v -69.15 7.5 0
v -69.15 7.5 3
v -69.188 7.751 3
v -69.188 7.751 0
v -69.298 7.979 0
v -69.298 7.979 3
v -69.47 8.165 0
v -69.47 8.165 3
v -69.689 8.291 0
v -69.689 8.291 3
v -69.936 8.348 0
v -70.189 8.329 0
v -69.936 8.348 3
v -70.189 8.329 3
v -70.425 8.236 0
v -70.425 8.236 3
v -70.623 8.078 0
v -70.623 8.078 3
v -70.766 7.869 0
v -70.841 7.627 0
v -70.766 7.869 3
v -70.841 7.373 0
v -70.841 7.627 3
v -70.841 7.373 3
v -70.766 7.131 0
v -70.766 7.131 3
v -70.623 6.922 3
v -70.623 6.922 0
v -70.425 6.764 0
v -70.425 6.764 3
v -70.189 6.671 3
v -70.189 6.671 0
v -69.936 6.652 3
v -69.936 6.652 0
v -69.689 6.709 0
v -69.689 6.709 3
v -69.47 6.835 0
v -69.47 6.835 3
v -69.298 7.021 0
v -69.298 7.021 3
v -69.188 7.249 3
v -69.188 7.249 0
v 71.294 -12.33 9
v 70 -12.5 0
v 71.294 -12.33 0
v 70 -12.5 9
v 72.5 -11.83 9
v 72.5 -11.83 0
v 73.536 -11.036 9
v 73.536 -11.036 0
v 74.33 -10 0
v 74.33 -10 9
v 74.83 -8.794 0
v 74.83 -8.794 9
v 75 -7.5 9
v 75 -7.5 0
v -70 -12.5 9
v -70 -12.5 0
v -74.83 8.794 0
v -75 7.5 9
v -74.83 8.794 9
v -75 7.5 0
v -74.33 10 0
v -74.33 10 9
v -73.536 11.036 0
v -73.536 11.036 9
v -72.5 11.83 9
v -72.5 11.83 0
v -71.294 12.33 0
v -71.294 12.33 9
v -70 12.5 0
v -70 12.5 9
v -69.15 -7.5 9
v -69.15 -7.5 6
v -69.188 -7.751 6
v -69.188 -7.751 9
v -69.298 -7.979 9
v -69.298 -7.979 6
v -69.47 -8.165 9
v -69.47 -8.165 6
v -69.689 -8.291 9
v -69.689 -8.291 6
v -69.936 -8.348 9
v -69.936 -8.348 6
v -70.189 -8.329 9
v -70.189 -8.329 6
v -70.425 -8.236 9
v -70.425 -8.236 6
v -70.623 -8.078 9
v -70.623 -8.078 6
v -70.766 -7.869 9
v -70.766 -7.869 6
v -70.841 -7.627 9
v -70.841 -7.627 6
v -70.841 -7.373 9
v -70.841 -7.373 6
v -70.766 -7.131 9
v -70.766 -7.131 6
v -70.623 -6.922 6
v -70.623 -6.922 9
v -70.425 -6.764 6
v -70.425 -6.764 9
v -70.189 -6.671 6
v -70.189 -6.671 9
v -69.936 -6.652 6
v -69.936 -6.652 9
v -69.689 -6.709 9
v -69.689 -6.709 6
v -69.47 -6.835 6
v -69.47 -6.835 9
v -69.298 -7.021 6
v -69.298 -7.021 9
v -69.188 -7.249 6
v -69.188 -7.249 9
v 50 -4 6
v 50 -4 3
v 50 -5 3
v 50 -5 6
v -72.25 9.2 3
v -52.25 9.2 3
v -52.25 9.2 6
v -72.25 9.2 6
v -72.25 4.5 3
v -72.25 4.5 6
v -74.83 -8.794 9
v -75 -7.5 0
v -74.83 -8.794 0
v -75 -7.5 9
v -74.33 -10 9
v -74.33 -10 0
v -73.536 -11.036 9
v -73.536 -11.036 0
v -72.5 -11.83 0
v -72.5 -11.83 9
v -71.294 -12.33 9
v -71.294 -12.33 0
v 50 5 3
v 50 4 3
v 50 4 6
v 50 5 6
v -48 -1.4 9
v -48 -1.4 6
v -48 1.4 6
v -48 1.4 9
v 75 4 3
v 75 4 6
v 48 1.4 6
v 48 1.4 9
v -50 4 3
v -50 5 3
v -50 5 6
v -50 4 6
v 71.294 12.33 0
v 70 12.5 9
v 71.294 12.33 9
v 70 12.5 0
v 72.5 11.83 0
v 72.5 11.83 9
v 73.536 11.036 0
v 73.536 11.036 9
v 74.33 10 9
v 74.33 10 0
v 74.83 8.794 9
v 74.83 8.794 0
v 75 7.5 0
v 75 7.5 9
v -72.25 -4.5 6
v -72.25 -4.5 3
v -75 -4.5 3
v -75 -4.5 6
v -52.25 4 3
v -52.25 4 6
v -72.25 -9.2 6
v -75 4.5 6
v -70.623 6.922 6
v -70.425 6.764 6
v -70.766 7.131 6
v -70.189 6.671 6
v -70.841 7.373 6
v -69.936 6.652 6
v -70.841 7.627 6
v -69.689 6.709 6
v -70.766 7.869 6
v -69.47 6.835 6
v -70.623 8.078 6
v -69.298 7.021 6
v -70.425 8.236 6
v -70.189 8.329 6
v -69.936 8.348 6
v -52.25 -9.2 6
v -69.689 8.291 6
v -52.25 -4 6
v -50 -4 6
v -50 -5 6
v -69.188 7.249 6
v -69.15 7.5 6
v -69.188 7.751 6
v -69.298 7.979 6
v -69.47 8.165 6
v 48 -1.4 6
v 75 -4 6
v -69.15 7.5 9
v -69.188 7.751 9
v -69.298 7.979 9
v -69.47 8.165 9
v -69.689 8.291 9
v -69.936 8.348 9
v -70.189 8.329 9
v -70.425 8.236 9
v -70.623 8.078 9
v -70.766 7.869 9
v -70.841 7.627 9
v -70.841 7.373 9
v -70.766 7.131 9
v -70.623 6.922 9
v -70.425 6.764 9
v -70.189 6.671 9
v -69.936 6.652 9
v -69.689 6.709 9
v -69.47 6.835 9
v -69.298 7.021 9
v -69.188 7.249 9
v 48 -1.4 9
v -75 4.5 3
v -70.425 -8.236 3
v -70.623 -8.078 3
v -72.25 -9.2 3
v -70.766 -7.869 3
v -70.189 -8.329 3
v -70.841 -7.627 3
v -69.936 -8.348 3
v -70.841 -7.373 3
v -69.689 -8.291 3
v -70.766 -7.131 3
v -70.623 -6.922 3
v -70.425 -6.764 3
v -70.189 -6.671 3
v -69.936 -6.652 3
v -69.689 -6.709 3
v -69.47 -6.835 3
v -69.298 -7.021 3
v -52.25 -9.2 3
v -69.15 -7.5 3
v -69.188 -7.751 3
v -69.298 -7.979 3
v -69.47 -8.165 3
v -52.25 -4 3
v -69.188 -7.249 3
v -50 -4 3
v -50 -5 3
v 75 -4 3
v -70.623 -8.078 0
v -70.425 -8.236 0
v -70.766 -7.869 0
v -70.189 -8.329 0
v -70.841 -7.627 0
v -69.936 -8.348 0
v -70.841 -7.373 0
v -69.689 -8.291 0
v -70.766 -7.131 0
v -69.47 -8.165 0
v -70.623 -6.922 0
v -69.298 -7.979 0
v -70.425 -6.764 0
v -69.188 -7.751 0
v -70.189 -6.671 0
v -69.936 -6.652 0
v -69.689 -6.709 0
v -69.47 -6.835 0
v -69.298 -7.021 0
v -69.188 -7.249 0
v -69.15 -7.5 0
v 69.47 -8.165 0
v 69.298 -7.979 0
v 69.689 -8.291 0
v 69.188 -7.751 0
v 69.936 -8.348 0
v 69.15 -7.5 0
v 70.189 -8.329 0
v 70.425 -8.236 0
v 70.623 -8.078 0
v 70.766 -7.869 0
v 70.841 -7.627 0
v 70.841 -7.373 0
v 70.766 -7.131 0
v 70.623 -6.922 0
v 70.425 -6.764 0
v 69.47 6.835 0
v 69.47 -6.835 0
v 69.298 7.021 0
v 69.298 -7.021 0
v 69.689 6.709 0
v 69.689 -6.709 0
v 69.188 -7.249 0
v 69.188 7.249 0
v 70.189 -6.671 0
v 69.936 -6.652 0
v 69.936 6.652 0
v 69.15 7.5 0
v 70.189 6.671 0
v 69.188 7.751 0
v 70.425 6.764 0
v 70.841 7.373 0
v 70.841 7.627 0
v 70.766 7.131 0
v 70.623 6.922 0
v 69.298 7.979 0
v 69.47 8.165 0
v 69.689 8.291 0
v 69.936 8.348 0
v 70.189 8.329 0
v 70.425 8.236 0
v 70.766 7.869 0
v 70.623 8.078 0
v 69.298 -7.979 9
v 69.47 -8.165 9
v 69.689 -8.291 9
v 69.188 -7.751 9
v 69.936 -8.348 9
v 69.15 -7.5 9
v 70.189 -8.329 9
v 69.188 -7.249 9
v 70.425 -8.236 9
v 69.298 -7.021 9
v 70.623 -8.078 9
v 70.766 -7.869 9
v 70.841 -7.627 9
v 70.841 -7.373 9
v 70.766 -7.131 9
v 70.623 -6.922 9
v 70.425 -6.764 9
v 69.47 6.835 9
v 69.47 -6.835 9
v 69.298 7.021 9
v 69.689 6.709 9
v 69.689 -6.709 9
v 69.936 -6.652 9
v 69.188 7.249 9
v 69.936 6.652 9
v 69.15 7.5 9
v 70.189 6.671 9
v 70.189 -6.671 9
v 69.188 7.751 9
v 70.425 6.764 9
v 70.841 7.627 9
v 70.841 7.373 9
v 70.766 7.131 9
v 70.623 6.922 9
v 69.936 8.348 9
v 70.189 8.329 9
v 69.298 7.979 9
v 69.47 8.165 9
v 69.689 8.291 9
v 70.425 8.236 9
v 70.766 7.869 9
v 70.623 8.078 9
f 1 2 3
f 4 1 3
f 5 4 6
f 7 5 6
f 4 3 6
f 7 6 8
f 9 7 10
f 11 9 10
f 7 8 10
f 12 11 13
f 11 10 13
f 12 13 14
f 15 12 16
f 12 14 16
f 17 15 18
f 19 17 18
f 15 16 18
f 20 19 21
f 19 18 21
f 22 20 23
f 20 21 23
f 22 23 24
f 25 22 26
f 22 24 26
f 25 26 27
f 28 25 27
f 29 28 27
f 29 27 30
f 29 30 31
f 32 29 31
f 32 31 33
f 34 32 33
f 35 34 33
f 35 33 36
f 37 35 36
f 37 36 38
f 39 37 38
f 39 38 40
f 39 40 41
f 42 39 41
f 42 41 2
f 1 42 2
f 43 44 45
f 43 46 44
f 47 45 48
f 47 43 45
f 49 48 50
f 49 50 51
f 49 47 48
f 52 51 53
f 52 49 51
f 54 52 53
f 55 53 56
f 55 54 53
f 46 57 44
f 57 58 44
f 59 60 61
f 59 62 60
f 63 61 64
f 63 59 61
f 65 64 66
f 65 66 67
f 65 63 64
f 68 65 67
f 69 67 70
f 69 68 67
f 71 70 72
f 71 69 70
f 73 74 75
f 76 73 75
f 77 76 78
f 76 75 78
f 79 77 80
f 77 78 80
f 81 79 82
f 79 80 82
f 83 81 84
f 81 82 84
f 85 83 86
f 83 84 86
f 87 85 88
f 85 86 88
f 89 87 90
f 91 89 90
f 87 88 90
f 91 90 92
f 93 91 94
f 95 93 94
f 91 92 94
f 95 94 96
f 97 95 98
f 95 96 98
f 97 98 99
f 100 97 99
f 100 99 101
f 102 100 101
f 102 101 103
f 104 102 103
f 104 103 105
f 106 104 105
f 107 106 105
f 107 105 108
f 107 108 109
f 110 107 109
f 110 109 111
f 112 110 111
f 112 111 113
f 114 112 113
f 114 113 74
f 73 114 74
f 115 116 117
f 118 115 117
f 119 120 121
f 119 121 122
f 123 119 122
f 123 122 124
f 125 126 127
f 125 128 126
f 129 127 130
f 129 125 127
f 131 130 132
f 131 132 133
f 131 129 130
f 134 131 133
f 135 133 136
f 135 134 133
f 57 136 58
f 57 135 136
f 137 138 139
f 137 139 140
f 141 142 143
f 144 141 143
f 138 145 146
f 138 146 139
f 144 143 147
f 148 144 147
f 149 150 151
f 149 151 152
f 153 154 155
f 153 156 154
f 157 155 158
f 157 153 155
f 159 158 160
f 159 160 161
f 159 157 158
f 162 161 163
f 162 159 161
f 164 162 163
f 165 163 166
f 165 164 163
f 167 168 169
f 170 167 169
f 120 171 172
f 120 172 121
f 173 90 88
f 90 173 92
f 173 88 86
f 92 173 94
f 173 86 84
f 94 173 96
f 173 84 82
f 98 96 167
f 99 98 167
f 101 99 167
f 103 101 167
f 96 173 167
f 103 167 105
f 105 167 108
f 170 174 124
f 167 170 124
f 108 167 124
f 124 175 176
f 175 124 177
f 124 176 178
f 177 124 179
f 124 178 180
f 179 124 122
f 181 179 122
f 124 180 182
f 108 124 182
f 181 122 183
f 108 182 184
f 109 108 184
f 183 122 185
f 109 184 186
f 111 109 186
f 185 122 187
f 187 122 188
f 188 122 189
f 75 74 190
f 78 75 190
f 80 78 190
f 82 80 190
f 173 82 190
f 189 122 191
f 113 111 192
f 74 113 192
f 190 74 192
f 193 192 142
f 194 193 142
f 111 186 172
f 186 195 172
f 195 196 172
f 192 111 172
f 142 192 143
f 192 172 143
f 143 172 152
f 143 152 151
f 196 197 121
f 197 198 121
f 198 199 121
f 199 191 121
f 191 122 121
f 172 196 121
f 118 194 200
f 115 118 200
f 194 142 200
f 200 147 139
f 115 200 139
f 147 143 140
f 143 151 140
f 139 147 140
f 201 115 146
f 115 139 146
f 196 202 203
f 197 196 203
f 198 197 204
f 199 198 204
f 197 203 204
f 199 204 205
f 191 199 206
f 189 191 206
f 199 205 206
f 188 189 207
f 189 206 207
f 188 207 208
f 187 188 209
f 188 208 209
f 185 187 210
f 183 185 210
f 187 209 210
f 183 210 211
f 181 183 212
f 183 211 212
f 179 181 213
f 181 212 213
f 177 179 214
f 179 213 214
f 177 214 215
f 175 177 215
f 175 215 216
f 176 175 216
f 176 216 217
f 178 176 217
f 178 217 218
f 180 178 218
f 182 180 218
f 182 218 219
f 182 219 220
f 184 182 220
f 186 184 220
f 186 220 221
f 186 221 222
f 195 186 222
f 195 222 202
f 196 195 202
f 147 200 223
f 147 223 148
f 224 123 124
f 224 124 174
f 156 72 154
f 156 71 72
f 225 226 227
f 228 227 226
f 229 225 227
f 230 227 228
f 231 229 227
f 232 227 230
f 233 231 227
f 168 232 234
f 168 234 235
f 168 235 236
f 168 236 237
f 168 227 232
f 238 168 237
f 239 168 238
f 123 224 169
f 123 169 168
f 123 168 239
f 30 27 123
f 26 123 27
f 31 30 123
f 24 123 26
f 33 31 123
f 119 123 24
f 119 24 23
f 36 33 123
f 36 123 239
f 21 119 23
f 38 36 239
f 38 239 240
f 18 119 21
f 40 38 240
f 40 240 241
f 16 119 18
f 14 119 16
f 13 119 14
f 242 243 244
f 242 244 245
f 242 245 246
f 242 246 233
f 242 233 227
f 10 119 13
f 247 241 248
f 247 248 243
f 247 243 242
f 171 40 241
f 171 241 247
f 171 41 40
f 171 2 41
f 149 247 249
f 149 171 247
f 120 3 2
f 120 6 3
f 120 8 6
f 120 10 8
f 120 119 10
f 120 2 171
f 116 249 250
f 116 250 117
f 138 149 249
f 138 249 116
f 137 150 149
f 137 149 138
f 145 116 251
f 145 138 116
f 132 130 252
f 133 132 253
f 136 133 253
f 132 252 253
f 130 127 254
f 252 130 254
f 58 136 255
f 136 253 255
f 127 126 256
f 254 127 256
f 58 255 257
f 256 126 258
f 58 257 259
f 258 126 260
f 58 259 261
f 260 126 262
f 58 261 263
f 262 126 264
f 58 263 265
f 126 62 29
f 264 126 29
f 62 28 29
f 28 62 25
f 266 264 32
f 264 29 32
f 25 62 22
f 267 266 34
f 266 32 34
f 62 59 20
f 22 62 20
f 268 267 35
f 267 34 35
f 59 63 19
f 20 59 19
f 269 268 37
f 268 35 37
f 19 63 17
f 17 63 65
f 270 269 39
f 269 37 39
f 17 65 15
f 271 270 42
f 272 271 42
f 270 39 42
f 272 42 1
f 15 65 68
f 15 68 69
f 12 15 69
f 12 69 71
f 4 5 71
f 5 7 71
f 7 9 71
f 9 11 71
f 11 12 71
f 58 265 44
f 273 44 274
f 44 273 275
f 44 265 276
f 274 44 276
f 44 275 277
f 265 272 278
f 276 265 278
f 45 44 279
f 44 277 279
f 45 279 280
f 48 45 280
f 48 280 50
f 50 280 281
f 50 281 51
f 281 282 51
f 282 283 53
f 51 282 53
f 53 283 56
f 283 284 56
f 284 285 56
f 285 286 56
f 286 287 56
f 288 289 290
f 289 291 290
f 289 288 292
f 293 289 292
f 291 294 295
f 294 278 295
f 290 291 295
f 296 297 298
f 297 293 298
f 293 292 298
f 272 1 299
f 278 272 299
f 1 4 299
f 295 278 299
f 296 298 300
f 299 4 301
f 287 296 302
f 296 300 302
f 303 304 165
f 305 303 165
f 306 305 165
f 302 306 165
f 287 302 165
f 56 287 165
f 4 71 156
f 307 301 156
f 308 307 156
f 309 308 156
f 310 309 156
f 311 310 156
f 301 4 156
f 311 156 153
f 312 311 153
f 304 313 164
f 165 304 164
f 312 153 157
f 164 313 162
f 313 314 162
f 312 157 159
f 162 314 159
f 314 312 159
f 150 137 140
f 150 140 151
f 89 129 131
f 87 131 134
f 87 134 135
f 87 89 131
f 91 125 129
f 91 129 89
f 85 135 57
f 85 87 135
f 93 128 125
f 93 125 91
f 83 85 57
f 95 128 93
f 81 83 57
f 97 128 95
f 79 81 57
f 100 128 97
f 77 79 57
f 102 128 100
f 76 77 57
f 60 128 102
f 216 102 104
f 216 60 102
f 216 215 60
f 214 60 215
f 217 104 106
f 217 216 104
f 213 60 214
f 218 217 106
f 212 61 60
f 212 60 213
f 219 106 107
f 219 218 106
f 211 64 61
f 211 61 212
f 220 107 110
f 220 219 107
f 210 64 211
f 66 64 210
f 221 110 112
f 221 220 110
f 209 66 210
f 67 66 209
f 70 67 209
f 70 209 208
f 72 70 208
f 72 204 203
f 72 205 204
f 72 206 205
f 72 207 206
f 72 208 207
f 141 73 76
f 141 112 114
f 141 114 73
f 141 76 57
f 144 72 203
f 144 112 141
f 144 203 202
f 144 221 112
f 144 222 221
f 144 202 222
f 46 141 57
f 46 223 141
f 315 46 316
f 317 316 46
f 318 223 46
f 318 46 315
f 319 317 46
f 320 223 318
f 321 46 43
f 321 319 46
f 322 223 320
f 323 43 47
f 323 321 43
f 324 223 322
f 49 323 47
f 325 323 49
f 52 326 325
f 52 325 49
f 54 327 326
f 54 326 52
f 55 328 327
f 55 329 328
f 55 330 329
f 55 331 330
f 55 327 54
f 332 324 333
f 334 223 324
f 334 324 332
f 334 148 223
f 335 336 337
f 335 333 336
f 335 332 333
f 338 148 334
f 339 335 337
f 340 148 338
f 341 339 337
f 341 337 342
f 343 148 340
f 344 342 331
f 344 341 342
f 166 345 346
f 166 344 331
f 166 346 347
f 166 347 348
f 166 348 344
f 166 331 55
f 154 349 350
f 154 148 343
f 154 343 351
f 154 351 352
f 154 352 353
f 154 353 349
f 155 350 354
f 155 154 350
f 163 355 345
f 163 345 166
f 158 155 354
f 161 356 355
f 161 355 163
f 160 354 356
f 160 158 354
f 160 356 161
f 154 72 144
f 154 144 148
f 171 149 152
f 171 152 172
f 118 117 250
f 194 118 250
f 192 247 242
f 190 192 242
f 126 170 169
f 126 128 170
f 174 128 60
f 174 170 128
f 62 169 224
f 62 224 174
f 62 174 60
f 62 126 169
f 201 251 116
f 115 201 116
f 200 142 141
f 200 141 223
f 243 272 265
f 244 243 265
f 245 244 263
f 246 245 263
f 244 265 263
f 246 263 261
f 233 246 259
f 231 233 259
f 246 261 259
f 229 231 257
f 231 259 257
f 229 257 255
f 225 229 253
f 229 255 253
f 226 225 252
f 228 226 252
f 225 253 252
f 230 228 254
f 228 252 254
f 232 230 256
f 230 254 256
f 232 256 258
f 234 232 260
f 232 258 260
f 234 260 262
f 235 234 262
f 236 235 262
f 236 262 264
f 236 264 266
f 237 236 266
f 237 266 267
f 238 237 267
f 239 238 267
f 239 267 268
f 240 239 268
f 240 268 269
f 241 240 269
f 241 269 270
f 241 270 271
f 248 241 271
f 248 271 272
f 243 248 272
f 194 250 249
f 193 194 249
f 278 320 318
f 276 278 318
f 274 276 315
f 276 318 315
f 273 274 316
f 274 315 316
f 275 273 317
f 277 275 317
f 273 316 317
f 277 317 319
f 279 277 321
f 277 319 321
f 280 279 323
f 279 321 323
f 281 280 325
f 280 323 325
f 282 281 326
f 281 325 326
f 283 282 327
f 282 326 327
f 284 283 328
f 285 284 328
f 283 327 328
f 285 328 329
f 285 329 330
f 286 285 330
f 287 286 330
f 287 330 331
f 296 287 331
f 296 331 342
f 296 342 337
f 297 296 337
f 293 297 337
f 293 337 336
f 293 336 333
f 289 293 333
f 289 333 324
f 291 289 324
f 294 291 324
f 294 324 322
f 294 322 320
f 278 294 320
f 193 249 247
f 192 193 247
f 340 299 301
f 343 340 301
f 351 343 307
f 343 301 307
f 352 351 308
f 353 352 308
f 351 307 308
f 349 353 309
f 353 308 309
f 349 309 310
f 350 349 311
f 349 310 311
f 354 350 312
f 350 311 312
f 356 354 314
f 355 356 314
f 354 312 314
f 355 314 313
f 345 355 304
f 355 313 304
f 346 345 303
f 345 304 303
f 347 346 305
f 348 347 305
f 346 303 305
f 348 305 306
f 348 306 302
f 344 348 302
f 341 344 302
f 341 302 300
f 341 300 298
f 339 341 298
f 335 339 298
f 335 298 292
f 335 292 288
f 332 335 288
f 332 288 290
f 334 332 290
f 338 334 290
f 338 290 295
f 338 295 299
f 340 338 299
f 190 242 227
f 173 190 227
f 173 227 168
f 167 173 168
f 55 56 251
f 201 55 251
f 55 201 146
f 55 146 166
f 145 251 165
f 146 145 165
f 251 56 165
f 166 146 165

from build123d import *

# Parameters (mm, degrees)
SKETCH_W              = 150
SKETCH_H              = 25
PAD_DEPTH             = 3
PAD001_DEPTH          = 3
SKETCH004_W           = 150
SKETCH004_H           = 25
SKETCH004_W_2         = 96
SKETCH004_H_2         = 2.8
PAD002_DEPTH          = 3
SKETCH005_R           = 0.85
POCKET_DEPTH          = 313.671314
POLARPATTERN_COUNT    = 2
POLARPATTERN001_COUNT = 2
POLARPATTERN002_COUNT = 2
FILLET_R              = 5


with BuildPart() as part:
    # Sketch → Pad (new body)
    with BuildSketch(Plane.XY):
        Rectangle(SKETCH_W, SKETCH_H)
    extrude(amount=PAD_DEPTH)

    # Sketch001 (on Face6 of Pad) → Pad001 (join)
    with BuildSketch(Plane.XY.offset(3)):
        Polygon((-75, 12.5), (75, 12.5), (75, 4), (50, 4), (50, 5), (-50, 5), (-50, 4), (-52.25, 4), (-52.25, 9.2), (-72.25, 9.2), (-72.25, 4.5), (-75, 4.5), align=None)
        Polygon((-75, -12.5), (75, -12.5), (75, -4), (50, -4), (50, -5), (-50, -5), (-50, -4), (-52.25, -4), (-52.25, -9.2), (-72.25, -9.2), (-72.25, -4.5), (-75, -4.5), align=None)
    extrude(amount=PAD001_DEPTH)

    # Sketch004 (on Face12 of Pad001) → Pad002 (join)
    with BuildSketch(Plane.XY.offset(6)):
        Rectangle(SKETCH004_W, SKETCH004_H)
        Rectangle(SKETCH004_W_2, SKETCH004_H_2, mode=Mode.SUBTRACT)
    extrude(amount=PAD002_DEPTH)

    # Sketch005 (on Face34 of Pad002) → Pocket (cut, through all)
    with BuildSketch(Plane.XY.offset(9)):
        with Locations((-70, 7.5)):
            Circle(SKETCH005_R)
    pocket = extrude(amount=-POCKET_DEPTH, mode=Mode.SUBTRACT)

    # PolarPattern: Pocket ×2 about axis
    polarpattern_axis = Axis((0, 0, 9), (0, 0, 1))
    for i in range(1, POLARPATTERN_COUNT):
        add(pocket.rotate(polarpattern_axis, i * 360 / POLARPATTERN_COUNT), mode=Mode.SUBTRACT)

    # PolarPattern001: Pocket ×2 about axis
    polarpattern001_axis = Axis((0, 0, 0), (0, 1, 0))
    for i in range(1, POLARPATTERN001_COUNT):
        add(pocket.rotate(polarpattern001_axis, i * 360 / POLARPATTERN001_COUNT), mode=Mode.SUBTRACT)

    # PolarPattern002: Pocket ×2 about axis
    polarpattern002_axis = Axis((0, 0, 0), (1, 0, 0))
    for i in range(1, POLARPATTERN002_COUNT):
        add(pocket.rotate(polarpattern002_axis, i * 360 / POLARPATTERN002_COUNT), mode=Mode.SUBTRACT)

    # Fillet
    fillet_edges = [part.edges().sort_by_distance(p)[0] for p in [
        (75, -12.5, 7.5),
        (75, 12.5, 7.5),
        (-75, -12.5, 7.5),
        (-75, 12.5, 7.5),
    ]]
    fillet(fillet_edges, radius=FILLET_R)


solid = part.part
